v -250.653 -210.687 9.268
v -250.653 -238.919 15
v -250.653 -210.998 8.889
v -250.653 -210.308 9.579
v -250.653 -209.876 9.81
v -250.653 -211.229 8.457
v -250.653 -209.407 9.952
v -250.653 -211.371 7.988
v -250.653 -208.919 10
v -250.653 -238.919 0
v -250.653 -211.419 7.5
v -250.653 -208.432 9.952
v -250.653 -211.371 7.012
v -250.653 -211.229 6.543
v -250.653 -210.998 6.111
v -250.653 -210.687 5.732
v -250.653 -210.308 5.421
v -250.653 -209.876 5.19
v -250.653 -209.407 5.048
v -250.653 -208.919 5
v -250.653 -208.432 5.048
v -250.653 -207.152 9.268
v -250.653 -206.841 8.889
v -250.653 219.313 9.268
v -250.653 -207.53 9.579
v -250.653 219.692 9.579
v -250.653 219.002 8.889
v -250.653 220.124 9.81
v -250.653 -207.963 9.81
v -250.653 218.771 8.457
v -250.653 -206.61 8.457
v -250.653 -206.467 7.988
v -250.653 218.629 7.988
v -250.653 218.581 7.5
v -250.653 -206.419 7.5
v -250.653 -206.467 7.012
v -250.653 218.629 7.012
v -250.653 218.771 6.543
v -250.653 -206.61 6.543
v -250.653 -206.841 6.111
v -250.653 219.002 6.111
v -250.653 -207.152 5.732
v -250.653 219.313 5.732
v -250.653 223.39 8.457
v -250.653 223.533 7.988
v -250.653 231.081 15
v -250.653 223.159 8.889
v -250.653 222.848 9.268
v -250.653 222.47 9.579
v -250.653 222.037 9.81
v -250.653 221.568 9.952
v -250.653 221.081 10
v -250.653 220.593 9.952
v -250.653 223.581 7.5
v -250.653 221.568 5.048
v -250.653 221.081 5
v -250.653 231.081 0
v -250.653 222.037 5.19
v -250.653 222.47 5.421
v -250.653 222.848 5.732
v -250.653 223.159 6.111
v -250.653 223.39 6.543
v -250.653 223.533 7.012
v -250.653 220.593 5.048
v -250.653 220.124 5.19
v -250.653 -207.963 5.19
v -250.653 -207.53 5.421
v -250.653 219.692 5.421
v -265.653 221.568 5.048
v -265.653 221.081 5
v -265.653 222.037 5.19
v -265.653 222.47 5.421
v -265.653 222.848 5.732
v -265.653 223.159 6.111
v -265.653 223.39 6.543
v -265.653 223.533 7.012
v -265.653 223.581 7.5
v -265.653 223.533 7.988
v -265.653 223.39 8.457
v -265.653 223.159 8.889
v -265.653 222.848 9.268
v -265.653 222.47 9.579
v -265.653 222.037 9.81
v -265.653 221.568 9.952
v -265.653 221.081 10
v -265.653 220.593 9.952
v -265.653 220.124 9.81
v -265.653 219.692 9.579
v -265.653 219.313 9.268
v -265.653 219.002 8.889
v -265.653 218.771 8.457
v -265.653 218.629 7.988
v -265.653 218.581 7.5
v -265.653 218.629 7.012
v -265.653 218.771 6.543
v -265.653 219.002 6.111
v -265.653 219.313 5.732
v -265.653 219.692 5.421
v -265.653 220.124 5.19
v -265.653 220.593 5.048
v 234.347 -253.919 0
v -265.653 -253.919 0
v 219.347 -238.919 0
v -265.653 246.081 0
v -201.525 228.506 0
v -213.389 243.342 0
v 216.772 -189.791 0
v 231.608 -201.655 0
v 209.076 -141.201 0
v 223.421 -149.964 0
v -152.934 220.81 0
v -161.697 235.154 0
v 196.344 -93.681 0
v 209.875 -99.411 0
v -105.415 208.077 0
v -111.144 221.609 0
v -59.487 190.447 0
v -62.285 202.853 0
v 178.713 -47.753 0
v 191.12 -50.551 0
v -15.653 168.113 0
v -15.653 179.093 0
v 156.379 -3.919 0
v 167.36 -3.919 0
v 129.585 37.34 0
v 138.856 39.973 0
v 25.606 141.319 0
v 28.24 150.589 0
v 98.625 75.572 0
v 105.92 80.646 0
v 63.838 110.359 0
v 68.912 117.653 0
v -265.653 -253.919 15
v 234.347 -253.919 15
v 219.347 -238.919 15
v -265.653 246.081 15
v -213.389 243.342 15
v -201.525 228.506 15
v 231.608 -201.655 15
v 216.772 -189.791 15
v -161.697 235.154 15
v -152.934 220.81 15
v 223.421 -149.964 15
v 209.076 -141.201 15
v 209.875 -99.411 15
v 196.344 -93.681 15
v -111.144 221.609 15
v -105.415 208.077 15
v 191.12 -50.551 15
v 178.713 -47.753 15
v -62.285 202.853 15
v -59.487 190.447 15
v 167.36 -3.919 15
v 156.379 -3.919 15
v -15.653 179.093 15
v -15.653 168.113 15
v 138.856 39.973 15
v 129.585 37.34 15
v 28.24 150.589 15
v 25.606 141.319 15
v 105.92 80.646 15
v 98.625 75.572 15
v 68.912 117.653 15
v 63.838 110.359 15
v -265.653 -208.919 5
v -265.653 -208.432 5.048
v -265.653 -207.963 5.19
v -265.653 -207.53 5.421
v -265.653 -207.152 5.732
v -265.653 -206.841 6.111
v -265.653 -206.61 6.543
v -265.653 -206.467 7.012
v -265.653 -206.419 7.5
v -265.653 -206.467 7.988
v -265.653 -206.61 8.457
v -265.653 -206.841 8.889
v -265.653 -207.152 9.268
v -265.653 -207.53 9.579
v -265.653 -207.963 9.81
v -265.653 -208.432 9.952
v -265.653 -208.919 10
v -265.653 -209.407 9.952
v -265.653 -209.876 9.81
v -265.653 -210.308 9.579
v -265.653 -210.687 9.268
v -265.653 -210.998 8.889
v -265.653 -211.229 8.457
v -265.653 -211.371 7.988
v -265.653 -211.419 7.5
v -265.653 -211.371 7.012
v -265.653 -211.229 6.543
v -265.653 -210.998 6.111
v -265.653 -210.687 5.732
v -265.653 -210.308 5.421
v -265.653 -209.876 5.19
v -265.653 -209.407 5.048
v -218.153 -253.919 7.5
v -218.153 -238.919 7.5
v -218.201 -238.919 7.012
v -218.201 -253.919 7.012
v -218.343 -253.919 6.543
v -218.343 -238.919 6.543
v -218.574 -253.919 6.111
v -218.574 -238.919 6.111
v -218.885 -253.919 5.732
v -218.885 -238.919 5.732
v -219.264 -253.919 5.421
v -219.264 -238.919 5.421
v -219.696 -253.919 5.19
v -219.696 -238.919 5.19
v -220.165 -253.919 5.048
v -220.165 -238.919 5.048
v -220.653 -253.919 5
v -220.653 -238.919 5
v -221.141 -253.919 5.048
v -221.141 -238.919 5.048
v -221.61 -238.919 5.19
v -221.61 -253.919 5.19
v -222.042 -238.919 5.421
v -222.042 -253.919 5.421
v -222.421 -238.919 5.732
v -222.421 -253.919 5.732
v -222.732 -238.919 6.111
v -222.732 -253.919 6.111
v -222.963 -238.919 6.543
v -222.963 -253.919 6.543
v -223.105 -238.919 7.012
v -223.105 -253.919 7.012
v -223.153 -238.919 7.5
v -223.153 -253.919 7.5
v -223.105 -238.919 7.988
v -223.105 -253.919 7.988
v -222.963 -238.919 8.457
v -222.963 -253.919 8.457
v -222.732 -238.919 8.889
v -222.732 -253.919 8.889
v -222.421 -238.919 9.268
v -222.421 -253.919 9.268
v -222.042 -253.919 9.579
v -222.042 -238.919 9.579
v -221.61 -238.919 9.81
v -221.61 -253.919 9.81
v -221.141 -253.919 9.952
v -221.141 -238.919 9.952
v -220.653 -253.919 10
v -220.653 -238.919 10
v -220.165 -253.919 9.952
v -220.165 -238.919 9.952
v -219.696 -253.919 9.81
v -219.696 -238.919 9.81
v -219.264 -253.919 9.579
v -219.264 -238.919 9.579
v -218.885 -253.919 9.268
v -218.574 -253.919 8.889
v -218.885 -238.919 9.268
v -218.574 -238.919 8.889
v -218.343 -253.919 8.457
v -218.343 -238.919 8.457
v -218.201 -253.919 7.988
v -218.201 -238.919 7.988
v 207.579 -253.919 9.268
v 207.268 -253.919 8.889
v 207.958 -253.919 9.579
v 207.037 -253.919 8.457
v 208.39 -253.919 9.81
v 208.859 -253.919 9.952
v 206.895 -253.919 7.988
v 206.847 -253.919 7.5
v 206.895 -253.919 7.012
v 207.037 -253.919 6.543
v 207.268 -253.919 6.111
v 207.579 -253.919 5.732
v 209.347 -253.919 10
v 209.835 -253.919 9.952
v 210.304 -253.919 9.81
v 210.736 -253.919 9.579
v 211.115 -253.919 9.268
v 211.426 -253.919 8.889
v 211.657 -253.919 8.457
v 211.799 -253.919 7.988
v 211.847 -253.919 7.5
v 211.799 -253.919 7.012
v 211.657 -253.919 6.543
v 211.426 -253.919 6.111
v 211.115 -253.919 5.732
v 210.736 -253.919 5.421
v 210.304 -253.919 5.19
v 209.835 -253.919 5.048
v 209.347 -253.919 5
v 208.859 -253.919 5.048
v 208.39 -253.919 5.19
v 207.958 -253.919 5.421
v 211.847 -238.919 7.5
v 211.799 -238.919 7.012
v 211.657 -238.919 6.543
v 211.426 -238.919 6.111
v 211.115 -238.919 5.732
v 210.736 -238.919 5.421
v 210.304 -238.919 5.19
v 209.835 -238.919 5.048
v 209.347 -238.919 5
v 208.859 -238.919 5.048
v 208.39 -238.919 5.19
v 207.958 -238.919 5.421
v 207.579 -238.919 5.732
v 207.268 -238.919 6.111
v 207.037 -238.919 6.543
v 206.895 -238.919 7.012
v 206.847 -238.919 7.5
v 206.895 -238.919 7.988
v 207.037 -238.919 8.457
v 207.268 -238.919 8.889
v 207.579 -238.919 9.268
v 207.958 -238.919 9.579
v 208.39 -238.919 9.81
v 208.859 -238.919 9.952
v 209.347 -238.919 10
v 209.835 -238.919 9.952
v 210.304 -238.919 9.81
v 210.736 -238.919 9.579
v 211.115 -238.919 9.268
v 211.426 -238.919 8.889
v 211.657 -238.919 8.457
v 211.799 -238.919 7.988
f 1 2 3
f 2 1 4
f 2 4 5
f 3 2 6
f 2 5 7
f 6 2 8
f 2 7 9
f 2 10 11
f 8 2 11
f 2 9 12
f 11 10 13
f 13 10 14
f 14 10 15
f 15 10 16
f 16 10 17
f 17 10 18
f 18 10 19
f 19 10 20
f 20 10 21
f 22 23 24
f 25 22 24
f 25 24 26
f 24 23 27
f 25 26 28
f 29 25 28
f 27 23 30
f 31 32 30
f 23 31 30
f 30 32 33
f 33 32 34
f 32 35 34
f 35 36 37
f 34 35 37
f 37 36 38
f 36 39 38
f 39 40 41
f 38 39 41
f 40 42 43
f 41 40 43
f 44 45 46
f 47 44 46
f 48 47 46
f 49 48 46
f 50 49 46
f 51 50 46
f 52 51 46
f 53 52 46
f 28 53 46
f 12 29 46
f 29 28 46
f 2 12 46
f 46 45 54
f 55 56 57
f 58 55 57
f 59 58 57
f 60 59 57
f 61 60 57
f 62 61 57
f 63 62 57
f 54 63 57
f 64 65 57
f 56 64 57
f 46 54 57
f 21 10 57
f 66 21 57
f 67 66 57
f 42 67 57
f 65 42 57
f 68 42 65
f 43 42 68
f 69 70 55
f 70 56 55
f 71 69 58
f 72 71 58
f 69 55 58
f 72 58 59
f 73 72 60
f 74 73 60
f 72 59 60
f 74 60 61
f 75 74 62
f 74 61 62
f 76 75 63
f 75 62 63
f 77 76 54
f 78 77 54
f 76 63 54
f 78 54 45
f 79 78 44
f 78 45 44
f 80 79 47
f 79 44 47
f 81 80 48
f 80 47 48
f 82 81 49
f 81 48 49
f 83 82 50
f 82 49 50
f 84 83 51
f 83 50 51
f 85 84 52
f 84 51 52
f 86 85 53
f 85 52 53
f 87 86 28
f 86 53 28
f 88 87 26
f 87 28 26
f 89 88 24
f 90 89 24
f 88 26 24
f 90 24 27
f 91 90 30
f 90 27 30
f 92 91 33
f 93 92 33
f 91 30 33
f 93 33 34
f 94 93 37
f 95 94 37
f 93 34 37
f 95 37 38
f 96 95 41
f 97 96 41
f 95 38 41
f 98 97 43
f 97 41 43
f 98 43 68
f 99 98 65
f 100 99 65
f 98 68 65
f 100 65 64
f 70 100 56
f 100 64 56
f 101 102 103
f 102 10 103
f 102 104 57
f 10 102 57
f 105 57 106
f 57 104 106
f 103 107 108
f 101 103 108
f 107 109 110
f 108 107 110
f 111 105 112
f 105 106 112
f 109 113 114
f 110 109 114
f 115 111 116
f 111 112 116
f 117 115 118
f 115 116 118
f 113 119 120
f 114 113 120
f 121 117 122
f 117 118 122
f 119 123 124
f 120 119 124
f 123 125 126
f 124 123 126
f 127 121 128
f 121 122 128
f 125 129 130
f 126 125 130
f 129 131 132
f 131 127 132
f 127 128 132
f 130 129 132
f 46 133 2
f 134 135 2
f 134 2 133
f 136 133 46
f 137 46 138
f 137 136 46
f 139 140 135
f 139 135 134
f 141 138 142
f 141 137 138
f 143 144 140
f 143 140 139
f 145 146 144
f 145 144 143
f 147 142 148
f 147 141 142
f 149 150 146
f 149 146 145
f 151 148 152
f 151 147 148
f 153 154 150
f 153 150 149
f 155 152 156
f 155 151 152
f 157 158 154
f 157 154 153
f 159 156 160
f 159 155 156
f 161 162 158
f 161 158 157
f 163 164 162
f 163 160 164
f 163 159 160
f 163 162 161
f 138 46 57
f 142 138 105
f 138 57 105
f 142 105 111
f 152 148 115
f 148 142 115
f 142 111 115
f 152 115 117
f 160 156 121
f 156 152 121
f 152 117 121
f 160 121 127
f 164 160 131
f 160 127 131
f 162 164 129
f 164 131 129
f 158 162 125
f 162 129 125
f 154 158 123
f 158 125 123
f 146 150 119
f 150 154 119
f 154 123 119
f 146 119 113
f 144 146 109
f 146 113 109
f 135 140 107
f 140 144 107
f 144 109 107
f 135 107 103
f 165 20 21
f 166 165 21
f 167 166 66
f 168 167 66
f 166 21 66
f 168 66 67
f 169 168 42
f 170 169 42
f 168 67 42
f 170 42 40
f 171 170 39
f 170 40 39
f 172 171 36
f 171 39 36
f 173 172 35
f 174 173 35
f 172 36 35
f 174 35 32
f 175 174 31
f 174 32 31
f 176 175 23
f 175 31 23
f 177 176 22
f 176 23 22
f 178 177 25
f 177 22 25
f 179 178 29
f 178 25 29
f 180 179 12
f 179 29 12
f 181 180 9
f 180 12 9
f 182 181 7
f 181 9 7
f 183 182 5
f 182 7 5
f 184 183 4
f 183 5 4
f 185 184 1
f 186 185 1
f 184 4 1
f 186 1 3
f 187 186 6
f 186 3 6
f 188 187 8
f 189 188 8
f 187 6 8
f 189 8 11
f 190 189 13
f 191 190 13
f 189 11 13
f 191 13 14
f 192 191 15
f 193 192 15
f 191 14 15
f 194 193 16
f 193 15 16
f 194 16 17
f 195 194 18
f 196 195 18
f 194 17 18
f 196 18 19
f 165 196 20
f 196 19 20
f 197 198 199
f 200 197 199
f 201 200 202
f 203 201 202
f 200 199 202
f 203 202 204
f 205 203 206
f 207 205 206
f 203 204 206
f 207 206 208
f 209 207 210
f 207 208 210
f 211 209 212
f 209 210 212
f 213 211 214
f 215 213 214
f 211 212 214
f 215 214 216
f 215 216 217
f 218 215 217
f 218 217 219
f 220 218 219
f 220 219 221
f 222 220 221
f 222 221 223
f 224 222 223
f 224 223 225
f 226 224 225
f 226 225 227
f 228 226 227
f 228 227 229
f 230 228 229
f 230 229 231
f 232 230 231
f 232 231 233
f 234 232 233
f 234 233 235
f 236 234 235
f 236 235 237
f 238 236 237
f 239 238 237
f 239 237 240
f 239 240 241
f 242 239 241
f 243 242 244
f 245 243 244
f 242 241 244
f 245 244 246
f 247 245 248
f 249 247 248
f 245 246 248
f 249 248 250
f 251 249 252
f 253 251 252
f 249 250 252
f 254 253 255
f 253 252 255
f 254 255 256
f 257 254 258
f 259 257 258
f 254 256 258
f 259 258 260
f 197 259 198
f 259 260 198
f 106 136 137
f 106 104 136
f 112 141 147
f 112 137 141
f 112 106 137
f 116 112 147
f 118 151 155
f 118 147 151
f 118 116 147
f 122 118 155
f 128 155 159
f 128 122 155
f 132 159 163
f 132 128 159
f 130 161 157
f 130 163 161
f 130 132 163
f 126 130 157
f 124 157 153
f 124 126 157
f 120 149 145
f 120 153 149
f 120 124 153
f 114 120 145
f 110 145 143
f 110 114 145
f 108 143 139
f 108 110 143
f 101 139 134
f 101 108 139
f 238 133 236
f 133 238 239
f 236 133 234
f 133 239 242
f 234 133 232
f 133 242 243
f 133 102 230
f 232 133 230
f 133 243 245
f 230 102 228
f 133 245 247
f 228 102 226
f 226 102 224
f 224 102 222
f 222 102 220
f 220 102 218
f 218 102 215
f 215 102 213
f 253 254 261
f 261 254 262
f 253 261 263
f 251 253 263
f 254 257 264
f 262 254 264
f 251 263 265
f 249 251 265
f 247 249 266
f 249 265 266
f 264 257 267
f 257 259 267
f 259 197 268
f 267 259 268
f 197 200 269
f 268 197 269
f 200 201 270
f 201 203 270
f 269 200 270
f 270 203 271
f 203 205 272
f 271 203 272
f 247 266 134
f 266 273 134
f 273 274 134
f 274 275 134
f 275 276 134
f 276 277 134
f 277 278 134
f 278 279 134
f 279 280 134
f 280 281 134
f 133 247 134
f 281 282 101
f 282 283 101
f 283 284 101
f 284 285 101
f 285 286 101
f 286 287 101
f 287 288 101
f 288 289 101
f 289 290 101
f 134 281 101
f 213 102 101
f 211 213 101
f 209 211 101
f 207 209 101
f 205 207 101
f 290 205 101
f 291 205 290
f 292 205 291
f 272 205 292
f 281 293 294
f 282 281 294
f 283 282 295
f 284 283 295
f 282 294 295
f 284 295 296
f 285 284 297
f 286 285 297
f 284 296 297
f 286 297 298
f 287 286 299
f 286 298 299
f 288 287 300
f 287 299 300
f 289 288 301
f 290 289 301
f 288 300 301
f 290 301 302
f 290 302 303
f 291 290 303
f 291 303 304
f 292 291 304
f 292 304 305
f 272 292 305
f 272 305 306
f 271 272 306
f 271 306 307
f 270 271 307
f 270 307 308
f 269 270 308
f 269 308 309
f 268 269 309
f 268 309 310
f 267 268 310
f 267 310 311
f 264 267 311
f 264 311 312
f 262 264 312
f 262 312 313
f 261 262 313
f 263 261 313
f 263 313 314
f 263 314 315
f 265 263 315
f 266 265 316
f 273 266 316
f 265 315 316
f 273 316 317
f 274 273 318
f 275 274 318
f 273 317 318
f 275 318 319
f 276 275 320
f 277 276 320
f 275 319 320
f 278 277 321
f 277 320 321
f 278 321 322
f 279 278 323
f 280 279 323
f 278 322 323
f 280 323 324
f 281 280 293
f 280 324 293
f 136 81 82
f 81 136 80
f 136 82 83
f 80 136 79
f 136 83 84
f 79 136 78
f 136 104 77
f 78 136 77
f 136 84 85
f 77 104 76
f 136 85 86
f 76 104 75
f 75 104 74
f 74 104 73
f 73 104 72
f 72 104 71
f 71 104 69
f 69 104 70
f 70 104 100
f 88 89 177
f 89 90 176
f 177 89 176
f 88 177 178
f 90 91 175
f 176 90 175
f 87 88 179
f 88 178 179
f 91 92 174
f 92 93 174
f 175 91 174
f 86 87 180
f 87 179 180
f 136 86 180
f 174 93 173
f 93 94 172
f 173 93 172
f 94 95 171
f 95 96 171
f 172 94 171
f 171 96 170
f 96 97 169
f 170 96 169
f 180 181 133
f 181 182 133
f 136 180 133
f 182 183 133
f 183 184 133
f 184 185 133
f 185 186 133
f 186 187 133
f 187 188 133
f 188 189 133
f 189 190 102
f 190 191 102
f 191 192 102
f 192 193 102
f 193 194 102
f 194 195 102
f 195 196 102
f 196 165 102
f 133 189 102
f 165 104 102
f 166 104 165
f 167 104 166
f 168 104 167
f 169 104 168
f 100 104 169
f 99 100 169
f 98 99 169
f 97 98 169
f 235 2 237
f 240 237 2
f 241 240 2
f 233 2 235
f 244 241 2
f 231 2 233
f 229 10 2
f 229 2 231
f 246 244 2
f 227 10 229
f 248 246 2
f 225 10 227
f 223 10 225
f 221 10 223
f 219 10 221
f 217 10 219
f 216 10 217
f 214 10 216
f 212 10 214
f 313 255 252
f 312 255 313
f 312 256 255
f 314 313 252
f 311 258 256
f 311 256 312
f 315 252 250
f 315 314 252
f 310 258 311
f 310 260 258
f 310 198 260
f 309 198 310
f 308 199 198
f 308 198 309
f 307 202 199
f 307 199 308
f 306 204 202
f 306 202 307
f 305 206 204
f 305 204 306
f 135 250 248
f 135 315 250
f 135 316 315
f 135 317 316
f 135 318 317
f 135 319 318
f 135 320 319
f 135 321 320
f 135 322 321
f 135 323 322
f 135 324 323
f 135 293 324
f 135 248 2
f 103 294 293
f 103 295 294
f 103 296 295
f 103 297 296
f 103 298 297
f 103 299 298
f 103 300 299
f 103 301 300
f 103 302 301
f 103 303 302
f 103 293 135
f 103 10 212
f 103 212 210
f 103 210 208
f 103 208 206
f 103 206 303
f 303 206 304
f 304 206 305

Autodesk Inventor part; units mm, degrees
ref_plane "YZ Plane" through (0, 0, 0) normal (1, 0, 0) x (0, 1, 0)
ref_plane "XZ Plane" through (0, 0, 0) normal (0, 1, 0) x (-1, 0, 0)
ref_plane "XY Plane" through (0, 0, 0) normal (0, 0, 1) x (1, 0, 0)
sketch "草图1" plane through (0, 0, 0) normal (0, 0, 1) x (1, 0, 0)
  line L0 (-265.6529, 246.0806) -> (-265.6529, -253.9194)
  line L1 (-265.6529, -253.9194) -> (234.3471, -253.9194)
  line L2 (-250.6529, -238.9194) -> (-250.6529, 231.0806)
  line L3 (-250.6529, -238.9194) -> (219.3471, -238.9194)
  arc A0 (219.3471, -238.9194) -> (-250.6529, 231.0806) centre (-250.6529, -238.9194) ccw
  arc A1 (234.3471, -253.9194) -> (-265.6529, 246.0806) centre (-265.6529, -253.9194) ccw
  point P0 (0, 0)
  dimension "d0" = 500
  dimension "d1" = 500
  dimension "d2" = 15
  dimension "d3" = 15
  dimension "d4" = 470
  dimension "d5" = 470
  dimension "d6" = 470
  dimension "d7" = 500
extrude "拉伸1" add sketch "草图1" along normal blind 15
sketch "草图2" plane through (-250.6529, -238.9194, 0) normal (1, 0, 0) x (0, 0, -1)
  circle A0 centre (-7.5, 30) radius 2.5
  circle A1 centre (-7.5, 460) radius 2.5
  line L0 (0, 0) -> (-15, 0) projected
  line L1 (0, 470) -> (0, 0) projected
  point P0 (0, 238.9194)
  dimension "d10" = 5
  dimension "d11" = 5
  dimension "d12" = 30
  dimension "d13" = 430
  dimension "d20" = 7.5
  dimension "d21" = 7.5
extrude "拉伸2" cut sketch "草图2" against normal blind 430
thread "螺纹1" size "M5x0.8" class "6H" standard "ANSI Metric M Profile" full length
thread "螺纹2" size "M5x0.8" class "6H" standard "ANSI Metric M Profile" full length
sketch "草图3" plane through (-250.6529, -238.9194, 0) normal (0, 1, 0) x (1, 0, 0)
  circle A0 centre (30, -7.5) radius 2.5
  circle A1 centre (460, -7.5) radius 2.5
  line L0 (0, 0) -> (0, -15) projected
  line L1 (470, -15) -> (0, -15) projected
  point P0 (250.6529, 0)
  dimension "d22" = 5
  dimension "d23" = 5
  dimension "d24" = 30
  dimension "d25" = 430
  dimension "d26" = 7.5
  dimension "d27" = 7.5
extrude "拉伸3" cut sketch "草图3" against normal through all
thread "螺纹3" size "M5x0.8" class "6H" standard "ANSI Metric M Profile" full length
thread "螺纹4" size "M5x0.8" class "6H" standard "ANSI Metric M Profile" full length
equation "\"d14\" = d13"
equation "\"d28\" = d22"
properties part number "Corner glass holding bar"
